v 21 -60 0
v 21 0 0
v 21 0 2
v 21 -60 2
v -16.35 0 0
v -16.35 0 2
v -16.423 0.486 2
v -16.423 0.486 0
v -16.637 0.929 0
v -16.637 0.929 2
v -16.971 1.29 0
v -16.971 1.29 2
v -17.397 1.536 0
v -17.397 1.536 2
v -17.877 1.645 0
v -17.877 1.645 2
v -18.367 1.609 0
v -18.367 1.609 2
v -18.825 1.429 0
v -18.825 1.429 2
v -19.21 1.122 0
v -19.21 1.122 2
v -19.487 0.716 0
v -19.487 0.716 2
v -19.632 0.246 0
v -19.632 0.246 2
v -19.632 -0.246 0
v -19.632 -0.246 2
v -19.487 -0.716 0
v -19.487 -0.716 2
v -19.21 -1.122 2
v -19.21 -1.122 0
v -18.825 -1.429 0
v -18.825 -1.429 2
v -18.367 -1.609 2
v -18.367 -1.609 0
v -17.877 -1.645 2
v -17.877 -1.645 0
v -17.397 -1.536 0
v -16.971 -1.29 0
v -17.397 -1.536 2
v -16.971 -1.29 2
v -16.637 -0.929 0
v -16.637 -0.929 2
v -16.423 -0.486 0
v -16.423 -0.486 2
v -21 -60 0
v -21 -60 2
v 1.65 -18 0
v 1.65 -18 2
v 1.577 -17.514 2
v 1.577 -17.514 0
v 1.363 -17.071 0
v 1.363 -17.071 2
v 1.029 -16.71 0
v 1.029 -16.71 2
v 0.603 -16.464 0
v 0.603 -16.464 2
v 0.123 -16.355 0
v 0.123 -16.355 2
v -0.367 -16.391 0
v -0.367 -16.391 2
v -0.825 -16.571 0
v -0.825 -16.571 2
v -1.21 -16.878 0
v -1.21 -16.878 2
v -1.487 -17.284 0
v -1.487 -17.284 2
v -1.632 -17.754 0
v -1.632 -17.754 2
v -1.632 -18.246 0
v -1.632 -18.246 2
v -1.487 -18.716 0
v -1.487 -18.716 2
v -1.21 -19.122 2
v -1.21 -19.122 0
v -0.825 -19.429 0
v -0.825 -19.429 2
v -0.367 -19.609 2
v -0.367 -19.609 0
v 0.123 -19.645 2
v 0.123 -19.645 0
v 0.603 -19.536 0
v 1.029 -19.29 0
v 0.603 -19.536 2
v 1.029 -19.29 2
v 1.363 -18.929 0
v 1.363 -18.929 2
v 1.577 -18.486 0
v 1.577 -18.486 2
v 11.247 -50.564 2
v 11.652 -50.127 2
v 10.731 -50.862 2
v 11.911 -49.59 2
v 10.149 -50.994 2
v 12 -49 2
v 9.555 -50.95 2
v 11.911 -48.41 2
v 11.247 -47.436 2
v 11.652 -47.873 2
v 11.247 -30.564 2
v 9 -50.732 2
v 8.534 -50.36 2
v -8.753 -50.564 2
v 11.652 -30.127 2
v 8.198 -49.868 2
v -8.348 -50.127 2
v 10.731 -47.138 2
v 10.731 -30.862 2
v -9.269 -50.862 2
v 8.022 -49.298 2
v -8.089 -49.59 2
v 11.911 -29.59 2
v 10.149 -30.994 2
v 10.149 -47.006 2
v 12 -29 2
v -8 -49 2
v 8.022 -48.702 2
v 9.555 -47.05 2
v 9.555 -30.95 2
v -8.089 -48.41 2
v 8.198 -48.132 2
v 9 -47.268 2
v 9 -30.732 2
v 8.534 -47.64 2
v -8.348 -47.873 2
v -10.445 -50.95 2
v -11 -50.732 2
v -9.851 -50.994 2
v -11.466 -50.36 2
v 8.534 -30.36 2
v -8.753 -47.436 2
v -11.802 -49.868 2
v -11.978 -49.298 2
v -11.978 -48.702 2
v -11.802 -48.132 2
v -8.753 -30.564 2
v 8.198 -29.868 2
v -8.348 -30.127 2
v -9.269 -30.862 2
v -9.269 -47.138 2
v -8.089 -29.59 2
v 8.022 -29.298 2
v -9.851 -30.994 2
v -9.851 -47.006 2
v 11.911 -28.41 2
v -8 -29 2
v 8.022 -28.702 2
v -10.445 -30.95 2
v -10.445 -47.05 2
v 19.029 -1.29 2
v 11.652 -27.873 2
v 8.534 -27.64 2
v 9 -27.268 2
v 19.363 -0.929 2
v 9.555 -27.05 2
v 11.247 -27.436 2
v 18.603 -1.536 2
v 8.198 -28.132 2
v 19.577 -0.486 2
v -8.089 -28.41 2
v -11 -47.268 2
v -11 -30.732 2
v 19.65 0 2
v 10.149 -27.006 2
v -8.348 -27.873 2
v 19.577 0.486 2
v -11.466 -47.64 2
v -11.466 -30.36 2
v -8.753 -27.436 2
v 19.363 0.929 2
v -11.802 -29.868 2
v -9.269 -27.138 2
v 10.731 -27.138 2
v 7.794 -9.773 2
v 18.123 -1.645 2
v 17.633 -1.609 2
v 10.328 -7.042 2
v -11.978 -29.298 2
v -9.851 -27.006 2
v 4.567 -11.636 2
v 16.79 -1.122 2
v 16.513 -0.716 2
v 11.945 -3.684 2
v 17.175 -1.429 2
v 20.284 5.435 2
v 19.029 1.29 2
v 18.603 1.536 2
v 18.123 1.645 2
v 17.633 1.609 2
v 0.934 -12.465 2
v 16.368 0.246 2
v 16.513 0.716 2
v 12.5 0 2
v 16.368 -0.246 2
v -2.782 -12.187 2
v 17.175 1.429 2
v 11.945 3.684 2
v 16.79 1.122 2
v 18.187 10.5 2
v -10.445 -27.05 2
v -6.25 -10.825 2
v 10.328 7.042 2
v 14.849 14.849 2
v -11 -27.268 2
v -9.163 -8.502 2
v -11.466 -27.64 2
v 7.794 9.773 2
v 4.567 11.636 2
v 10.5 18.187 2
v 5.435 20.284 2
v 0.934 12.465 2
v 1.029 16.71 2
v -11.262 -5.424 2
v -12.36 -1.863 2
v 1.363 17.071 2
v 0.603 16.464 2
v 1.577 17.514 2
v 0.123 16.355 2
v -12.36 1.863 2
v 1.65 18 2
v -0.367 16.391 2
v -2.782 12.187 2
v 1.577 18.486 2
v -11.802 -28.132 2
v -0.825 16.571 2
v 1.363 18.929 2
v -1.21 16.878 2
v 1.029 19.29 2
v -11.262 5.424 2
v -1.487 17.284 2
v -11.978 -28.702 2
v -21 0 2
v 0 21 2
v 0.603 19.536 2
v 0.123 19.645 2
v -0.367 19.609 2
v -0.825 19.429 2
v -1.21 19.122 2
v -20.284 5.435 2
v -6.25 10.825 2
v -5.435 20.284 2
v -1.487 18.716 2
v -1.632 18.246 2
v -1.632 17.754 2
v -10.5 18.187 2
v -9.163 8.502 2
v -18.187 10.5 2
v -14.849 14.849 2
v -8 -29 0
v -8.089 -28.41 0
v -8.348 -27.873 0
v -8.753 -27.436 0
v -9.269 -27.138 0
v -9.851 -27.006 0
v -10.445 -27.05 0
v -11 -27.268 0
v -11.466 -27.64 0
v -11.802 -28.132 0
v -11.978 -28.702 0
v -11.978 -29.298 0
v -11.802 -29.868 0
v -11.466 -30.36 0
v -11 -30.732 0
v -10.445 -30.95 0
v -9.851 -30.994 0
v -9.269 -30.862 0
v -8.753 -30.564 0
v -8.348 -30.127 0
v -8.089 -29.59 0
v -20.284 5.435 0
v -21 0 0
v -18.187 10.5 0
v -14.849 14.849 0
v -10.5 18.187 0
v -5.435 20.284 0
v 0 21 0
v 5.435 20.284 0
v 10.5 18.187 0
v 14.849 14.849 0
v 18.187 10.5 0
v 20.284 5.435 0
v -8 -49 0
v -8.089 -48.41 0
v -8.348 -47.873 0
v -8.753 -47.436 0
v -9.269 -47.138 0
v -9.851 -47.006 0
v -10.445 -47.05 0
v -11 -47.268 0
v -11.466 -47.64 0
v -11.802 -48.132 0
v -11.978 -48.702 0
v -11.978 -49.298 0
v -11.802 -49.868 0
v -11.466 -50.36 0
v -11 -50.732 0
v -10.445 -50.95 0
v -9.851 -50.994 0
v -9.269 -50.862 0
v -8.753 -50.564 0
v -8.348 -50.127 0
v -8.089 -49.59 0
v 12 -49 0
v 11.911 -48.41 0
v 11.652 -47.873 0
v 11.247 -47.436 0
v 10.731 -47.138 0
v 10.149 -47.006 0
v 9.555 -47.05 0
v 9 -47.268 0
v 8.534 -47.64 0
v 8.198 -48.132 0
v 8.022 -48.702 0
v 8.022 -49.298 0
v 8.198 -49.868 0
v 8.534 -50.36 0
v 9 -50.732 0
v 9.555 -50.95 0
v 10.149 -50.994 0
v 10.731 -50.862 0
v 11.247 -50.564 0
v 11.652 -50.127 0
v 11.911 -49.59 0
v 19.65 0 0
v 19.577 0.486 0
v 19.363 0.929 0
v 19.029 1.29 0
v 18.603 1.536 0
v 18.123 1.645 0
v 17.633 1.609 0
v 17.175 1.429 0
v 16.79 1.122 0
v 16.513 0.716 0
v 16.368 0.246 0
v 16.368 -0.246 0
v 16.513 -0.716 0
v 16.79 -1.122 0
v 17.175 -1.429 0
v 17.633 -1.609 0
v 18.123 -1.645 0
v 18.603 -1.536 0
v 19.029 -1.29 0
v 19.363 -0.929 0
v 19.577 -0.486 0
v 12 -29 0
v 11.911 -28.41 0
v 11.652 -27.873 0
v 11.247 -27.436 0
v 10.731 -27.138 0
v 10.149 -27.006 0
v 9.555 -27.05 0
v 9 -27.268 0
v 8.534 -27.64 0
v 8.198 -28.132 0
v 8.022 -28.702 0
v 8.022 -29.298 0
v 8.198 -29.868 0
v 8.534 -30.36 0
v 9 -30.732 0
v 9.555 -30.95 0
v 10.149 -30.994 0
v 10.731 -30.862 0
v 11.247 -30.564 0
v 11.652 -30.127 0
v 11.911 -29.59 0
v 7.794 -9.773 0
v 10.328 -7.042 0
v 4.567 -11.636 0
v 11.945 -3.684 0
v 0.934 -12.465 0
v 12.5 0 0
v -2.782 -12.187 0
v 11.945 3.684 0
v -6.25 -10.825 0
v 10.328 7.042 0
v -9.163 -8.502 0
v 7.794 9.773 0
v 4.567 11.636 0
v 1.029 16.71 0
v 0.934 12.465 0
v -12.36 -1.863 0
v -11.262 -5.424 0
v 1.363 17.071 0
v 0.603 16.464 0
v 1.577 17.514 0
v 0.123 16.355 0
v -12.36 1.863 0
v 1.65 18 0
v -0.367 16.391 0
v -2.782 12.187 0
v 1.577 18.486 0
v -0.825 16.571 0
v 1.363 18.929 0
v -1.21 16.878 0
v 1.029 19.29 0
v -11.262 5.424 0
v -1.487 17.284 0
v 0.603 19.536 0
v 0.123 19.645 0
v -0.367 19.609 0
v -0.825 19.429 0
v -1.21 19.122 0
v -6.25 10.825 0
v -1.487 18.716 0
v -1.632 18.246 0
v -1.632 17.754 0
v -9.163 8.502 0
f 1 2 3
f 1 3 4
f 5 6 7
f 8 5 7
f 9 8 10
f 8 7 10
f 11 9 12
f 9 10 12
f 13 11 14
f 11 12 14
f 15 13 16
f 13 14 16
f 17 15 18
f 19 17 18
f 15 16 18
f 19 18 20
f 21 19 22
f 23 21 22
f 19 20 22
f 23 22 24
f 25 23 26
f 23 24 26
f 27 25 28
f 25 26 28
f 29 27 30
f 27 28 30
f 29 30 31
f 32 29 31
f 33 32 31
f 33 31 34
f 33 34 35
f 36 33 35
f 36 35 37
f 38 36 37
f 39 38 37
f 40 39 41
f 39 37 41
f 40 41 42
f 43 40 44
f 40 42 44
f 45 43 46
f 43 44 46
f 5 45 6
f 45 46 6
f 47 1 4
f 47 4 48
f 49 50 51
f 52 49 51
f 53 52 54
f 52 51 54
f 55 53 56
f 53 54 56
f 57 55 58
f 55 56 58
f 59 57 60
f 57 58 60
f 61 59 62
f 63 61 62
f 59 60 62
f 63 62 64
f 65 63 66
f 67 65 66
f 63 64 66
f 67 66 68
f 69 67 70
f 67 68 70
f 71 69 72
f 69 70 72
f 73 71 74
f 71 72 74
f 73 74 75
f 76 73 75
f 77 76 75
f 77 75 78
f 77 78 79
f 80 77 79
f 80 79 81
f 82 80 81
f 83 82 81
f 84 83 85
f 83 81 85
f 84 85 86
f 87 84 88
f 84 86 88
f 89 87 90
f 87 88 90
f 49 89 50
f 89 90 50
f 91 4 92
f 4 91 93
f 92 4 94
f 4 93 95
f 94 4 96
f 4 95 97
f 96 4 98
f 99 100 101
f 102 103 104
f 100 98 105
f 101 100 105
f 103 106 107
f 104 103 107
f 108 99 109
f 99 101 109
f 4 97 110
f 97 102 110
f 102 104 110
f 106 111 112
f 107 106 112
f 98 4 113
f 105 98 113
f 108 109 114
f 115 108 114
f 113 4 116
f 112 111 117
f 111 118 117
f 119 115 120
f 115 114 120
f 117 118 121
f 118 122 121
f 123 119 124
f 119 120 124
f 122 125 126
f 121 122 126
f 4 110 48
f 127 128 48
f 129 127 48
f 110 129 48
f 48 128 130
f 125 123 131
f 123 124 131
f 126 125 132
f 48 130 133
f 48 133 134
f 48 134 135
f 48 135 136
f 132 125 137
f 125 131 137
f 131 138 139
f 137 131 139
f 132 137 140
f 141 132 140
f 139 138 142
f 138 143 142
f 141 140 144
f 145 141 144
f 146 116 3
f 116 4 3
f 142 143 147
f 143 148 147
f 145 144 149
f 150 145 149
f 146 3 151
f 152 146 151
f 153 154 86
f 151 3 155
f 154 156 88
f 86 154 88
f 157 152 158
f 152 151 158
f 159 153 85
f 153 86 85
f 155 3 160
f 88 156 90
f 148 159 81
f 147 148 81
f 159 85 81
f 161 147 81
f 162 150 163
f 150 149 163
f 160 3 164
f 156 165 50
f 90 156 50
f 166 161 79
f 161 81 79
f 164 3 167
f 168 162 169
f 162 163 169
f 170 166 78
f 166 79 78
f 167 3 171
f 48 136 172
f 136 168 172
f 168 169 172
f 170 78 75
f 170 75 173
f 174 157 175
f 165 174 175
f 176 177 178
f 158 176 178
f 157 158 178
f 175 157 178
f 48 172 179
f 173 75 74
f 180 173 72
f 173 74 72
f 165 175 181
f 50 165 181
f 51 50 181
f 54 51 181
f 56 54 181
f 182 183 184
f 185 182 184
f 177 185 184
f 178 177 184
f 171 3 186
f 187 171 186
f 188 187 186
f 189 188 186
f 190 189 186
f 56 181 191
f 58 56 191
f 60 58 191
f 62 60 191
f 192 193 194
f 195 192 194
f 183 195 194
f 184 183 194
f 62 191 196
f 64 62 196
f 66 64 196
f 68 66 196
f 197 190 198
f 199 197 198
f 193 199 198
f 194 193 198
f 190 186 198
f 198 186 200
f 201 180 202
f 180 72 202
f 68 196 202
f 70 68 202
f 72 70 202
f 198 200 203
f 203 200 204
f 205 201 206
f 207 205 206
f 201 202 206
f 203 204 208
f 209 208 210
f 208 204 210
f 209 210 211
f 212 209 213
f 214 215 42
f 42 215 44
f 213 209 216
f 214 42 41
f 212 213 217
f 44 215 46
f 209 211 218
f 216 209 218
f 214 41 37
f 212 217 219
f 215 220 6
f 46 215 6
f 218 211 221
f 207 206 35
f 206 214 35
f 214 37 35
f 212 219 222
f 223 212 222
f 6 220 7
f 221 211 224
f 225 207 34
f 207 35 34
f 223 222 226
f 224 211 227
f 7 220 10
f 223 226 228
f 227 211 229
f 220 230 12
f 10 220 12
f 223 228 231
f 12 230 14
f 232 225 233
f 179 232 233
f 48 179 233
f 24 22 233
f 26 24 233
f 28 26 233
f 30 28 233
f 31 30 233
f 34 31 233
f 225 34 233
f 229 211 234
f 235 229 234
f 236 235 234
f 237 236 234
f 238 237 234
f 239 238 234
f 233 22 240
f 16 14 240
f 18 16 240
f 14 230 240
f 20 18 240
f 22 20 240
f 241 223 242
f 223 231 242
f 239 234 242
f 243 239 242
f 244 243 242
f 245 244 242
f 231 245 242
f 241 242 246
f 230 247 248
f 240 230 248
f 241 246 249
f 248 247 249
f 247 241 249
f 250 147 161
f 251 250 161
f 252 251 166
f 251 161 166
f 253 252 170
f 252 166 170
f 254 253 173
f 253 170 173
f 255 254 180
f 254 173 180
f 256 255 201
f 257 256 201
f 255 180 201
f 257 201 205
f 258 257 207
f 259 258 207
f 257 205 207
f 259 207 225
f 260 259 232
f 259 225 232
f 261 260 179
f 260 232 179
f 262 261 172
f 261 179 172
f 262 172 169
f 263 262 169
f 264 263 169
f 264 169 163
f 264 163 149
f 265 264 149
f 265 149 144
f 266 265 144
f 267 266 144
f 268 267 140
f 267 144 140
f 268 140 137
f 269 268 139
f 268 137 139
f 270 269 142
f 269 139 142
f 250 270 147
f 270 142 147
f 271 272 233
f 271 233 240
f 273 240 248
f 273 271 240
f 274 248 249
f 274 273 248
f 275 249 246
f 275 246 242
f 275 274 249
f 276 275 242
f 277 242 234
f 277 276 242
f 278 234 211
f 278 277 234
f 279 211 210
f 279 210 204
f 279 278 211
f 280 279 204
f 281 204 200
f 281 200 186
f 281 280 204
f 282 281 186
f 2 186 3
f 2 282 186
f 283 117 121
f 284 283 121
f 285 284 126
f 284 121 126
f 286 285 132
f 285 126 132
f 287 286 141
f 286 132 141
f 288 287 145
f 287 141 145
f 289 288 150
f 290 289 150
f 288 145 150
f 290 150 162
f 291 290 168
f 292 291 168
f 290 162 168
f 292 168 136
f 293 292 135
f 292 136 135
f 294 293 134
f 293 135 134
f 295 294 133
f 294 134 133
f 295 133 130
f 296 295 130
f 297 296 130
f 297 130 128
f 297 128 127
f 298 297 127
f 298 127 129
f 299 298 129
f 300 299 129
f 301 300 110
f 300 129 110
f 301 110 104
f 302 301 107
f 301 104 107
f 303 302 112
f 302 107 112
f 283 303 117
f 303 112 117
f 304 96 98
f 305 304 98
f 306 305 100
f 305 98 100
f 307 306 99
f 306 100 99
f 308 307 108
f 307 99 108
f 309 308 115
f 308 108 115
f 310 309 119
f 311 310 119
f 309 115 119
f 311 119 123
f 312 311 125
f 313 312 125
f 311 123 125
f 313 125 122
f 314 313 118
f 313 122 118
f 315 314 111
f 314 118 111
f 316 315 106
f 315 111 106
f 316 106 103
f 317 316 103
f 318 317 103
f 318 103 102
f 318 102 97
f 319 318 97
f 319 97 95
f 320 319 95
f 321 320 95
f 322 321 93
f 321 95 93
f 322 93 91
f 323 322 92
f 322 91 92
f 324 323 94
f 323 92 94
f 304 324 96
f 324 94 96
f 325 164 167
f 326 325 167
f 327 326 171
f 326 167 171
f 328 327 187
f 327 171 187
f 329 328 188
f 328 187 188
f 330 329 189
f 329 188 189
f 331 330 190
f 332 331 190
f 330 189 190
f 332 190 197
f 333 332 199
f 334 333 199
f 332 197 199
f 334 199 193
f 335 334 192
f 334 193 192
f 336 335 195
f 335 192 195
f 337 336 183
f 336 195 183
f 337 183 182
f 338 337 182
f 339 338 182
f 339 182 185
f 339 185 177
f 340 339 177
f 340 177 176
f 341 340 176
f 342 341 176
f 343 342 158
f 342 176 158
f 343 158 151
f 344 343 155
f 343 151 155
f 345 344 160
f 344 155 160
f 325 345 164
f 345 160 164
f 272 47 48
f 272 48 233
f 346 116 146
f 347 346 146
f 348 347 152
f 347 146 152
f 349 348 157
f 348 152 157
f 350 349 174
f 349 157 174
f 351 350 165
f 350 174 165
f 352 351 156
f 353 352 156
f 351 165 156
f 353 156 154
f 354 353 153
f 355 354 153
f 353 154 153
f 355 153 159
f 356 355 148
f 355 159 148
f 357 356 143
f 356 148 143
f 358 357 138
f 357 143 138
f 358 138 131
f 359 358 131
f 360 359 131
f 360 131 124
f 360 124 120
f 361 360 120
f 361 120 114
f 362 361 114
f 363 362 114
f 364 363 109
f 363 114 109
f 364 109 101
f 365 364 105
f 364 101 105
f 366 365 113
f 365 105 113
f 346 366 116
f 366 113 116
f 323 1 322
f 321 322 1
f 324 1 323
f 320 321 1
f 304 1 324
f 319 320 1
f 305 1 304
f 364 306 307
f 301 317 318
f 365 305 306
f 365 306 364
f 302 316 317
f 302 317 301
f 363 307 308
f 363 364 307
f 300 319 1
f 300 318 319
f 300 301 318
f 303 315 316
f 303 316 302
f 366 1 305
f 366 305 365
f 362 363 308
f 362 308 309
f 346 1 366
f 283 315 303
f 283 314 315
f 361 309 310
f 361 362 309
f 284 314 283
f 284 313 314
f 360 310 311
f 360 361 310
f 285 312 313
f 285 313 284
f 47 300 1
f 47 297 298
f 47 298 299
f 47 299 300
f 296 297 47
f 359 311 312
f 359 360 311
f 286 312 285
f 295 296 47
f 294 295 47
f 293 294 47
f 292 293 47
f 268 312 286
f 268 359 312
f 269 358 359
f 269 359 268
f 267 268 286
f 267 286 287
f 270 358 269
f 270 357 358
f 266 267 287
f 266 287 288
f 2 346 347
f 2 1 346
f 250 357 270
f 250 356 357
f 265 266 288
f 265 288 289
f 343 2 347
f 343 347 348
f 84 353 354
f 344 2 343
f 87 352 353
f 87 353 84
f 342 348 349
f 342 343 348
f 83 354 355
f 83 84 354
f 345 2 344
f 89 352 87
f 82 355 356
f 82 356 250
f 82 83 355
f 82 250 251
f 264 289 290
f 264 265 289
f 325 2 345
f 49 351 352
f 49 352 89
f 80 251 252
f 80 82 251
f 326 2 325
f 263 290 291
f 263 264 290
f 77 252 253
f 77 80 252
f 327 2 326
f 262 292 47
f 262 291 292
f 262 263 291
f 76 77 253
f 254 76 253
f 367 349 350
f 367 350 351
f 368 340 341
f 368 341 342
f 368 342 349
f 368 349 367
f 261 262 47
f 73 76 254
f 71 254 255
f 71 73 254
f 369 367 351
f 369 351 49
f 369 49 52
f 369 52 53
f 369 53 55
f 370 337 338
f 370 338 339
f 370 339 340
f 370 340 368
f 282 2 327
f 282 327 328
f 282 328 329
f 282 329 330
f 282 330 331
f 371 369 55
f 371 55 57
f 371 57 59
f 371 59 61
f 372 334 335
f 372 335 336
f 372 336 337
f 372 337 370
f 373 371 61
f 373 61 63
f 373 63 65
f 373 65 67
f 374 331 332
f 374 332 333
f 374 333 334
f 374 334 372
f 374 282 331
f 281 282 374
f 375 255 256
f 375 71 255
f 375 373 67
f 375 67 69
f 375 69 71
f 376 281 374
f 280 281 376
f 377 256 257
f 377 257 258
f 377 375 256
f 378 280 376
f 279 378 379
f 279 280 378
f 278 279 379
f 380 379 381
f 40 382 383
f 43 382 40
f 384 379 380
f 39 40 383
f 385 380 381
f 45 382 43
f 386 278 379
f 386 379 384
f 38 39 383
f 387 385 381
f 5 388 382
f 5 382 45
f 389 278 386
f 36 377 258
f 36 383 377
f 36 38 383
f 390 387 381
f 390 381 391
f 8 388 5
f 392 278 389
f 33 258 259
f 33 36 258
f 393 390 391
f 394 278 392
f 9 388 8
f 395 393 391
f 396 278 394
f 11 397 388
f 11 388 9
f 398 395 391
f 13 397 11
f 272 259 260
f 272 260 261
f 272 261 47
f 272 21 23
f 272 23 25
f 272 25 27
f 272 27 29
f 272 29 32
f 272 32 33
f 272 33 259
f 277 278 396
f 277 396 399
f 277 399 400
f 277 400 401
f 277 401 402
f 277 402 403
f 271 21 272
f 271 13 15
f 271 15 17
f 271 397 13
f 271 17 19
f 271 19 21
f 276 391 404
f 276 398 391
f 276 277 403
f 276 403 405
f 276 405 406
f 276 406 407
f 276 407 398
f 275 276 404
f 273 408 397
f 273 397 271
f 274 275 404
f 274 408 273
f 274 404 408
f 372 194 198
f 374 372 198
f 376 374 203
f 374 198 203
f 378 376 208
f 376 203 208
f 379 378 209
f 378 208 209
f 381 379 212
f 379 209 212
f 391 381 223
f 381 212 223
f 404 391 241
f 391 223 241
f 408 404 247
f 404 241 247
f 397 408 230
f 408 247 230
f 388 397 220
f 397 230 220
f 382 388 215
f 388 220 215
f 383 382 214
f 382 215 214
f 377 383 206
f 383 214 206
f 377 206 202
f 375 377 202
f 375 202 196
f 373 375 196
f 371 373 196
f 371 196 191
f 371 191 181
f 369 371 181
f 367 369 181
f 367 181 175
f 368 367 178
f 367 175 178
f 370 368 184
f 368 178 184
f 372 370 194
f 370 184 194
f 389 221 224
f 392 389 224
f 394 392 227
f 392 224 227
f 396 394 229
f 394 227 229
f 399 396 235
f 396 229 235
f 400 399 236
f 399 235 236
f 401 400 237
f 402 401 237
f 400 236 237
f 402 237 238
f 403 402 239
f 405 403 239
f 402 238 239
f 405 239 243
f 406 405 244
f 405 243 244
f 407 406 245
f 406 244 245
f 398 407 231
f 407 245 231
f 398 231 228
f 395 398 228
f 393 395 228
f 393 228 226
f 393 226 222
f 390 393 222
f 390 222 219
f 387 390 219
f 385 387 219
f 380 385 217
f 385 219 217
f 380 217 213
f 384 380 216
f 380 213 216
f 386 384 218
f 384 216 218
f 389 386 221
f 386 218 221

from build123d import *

# Parameters (mm, degrees)
ESTRUSIONE_ESTRUSIONE1_DEPTH = 2
SCHIZZO2_R                   = 1.65
TAGLIO_ESTRUSIONE1_DEPTH     = 2
SCHIZZO3_R                   = 12.5
TAGLIO_ESTRUSIONE2_DEPTH     = 2
SCHIZZO4_R                   = 2
TAGLIO_ESTRUSIONE3_DEPTH     = 2


with BuildPart() as part:
    # Schizzo1 → Estrusione-Estrusione1 (new body)
    with BuildSketch(Plane.XY):
        with BuildLine():
            Line((21, 0), (21, -60))
            Line((21, -60), (-21, -60))
            Line((-21, -60), (-21, 0))
            ThreePointArc((-21, 0), (0, 21), (21, 0))
        make_face()
    extrude(amount=ESTRUSIONE_ESTRUSIONE1_DEPTH)

    # Schizzo2 → Taglio-Estrusione1 (cut)
    with BuildSketch(Plane.XY.offset(2)):
        with Locations((-18, 0)):
            Circle(SCHIZZO2_R)
        with Locations((18, 0)):
            Circle(SCHIZZO2_R)
        with Locations((0, 18)):
            Circle(SCHIZZO2_R)
        with Locations((0, -18)):
            Circle(SCHIZZO2_R)
    extrude(amount=-TAGLIO_ESTRUSIONE1_DEPTH, mode=Mode.SUBTRACT)

    # Schizzo3 → Taglio-Estrusione2 (cut)
    with BuildSketch(Plane.XY.offset(2)):
        Circle(SCHIZZO3_R)
    extrude(amount=-TAGLIO_ESTRUSIONE2_DEPTH, mode=Mode.SUBTRACT)

    # Schizzo4 → Taglio-Estrusione3 (cut)
    with BuildSketch(Plane.XY.offset(2)):
        with Locations((-10, -29)):
            Circle(SCHIZZO4_R)
        with Locations((10, -29)):
            Circle(SCHIZZO4_R)
        with Locations((10, -49)):
            Circle(SCHIZZO4_R)
        with Locations((-10, -49)):
            Circle(SCHIZZO4_R)
    extrude(amount=-TAGLIO_ESTRUSIONE3_DEPTH, mode=Mode.SUBTRACT)


solid = part.part
